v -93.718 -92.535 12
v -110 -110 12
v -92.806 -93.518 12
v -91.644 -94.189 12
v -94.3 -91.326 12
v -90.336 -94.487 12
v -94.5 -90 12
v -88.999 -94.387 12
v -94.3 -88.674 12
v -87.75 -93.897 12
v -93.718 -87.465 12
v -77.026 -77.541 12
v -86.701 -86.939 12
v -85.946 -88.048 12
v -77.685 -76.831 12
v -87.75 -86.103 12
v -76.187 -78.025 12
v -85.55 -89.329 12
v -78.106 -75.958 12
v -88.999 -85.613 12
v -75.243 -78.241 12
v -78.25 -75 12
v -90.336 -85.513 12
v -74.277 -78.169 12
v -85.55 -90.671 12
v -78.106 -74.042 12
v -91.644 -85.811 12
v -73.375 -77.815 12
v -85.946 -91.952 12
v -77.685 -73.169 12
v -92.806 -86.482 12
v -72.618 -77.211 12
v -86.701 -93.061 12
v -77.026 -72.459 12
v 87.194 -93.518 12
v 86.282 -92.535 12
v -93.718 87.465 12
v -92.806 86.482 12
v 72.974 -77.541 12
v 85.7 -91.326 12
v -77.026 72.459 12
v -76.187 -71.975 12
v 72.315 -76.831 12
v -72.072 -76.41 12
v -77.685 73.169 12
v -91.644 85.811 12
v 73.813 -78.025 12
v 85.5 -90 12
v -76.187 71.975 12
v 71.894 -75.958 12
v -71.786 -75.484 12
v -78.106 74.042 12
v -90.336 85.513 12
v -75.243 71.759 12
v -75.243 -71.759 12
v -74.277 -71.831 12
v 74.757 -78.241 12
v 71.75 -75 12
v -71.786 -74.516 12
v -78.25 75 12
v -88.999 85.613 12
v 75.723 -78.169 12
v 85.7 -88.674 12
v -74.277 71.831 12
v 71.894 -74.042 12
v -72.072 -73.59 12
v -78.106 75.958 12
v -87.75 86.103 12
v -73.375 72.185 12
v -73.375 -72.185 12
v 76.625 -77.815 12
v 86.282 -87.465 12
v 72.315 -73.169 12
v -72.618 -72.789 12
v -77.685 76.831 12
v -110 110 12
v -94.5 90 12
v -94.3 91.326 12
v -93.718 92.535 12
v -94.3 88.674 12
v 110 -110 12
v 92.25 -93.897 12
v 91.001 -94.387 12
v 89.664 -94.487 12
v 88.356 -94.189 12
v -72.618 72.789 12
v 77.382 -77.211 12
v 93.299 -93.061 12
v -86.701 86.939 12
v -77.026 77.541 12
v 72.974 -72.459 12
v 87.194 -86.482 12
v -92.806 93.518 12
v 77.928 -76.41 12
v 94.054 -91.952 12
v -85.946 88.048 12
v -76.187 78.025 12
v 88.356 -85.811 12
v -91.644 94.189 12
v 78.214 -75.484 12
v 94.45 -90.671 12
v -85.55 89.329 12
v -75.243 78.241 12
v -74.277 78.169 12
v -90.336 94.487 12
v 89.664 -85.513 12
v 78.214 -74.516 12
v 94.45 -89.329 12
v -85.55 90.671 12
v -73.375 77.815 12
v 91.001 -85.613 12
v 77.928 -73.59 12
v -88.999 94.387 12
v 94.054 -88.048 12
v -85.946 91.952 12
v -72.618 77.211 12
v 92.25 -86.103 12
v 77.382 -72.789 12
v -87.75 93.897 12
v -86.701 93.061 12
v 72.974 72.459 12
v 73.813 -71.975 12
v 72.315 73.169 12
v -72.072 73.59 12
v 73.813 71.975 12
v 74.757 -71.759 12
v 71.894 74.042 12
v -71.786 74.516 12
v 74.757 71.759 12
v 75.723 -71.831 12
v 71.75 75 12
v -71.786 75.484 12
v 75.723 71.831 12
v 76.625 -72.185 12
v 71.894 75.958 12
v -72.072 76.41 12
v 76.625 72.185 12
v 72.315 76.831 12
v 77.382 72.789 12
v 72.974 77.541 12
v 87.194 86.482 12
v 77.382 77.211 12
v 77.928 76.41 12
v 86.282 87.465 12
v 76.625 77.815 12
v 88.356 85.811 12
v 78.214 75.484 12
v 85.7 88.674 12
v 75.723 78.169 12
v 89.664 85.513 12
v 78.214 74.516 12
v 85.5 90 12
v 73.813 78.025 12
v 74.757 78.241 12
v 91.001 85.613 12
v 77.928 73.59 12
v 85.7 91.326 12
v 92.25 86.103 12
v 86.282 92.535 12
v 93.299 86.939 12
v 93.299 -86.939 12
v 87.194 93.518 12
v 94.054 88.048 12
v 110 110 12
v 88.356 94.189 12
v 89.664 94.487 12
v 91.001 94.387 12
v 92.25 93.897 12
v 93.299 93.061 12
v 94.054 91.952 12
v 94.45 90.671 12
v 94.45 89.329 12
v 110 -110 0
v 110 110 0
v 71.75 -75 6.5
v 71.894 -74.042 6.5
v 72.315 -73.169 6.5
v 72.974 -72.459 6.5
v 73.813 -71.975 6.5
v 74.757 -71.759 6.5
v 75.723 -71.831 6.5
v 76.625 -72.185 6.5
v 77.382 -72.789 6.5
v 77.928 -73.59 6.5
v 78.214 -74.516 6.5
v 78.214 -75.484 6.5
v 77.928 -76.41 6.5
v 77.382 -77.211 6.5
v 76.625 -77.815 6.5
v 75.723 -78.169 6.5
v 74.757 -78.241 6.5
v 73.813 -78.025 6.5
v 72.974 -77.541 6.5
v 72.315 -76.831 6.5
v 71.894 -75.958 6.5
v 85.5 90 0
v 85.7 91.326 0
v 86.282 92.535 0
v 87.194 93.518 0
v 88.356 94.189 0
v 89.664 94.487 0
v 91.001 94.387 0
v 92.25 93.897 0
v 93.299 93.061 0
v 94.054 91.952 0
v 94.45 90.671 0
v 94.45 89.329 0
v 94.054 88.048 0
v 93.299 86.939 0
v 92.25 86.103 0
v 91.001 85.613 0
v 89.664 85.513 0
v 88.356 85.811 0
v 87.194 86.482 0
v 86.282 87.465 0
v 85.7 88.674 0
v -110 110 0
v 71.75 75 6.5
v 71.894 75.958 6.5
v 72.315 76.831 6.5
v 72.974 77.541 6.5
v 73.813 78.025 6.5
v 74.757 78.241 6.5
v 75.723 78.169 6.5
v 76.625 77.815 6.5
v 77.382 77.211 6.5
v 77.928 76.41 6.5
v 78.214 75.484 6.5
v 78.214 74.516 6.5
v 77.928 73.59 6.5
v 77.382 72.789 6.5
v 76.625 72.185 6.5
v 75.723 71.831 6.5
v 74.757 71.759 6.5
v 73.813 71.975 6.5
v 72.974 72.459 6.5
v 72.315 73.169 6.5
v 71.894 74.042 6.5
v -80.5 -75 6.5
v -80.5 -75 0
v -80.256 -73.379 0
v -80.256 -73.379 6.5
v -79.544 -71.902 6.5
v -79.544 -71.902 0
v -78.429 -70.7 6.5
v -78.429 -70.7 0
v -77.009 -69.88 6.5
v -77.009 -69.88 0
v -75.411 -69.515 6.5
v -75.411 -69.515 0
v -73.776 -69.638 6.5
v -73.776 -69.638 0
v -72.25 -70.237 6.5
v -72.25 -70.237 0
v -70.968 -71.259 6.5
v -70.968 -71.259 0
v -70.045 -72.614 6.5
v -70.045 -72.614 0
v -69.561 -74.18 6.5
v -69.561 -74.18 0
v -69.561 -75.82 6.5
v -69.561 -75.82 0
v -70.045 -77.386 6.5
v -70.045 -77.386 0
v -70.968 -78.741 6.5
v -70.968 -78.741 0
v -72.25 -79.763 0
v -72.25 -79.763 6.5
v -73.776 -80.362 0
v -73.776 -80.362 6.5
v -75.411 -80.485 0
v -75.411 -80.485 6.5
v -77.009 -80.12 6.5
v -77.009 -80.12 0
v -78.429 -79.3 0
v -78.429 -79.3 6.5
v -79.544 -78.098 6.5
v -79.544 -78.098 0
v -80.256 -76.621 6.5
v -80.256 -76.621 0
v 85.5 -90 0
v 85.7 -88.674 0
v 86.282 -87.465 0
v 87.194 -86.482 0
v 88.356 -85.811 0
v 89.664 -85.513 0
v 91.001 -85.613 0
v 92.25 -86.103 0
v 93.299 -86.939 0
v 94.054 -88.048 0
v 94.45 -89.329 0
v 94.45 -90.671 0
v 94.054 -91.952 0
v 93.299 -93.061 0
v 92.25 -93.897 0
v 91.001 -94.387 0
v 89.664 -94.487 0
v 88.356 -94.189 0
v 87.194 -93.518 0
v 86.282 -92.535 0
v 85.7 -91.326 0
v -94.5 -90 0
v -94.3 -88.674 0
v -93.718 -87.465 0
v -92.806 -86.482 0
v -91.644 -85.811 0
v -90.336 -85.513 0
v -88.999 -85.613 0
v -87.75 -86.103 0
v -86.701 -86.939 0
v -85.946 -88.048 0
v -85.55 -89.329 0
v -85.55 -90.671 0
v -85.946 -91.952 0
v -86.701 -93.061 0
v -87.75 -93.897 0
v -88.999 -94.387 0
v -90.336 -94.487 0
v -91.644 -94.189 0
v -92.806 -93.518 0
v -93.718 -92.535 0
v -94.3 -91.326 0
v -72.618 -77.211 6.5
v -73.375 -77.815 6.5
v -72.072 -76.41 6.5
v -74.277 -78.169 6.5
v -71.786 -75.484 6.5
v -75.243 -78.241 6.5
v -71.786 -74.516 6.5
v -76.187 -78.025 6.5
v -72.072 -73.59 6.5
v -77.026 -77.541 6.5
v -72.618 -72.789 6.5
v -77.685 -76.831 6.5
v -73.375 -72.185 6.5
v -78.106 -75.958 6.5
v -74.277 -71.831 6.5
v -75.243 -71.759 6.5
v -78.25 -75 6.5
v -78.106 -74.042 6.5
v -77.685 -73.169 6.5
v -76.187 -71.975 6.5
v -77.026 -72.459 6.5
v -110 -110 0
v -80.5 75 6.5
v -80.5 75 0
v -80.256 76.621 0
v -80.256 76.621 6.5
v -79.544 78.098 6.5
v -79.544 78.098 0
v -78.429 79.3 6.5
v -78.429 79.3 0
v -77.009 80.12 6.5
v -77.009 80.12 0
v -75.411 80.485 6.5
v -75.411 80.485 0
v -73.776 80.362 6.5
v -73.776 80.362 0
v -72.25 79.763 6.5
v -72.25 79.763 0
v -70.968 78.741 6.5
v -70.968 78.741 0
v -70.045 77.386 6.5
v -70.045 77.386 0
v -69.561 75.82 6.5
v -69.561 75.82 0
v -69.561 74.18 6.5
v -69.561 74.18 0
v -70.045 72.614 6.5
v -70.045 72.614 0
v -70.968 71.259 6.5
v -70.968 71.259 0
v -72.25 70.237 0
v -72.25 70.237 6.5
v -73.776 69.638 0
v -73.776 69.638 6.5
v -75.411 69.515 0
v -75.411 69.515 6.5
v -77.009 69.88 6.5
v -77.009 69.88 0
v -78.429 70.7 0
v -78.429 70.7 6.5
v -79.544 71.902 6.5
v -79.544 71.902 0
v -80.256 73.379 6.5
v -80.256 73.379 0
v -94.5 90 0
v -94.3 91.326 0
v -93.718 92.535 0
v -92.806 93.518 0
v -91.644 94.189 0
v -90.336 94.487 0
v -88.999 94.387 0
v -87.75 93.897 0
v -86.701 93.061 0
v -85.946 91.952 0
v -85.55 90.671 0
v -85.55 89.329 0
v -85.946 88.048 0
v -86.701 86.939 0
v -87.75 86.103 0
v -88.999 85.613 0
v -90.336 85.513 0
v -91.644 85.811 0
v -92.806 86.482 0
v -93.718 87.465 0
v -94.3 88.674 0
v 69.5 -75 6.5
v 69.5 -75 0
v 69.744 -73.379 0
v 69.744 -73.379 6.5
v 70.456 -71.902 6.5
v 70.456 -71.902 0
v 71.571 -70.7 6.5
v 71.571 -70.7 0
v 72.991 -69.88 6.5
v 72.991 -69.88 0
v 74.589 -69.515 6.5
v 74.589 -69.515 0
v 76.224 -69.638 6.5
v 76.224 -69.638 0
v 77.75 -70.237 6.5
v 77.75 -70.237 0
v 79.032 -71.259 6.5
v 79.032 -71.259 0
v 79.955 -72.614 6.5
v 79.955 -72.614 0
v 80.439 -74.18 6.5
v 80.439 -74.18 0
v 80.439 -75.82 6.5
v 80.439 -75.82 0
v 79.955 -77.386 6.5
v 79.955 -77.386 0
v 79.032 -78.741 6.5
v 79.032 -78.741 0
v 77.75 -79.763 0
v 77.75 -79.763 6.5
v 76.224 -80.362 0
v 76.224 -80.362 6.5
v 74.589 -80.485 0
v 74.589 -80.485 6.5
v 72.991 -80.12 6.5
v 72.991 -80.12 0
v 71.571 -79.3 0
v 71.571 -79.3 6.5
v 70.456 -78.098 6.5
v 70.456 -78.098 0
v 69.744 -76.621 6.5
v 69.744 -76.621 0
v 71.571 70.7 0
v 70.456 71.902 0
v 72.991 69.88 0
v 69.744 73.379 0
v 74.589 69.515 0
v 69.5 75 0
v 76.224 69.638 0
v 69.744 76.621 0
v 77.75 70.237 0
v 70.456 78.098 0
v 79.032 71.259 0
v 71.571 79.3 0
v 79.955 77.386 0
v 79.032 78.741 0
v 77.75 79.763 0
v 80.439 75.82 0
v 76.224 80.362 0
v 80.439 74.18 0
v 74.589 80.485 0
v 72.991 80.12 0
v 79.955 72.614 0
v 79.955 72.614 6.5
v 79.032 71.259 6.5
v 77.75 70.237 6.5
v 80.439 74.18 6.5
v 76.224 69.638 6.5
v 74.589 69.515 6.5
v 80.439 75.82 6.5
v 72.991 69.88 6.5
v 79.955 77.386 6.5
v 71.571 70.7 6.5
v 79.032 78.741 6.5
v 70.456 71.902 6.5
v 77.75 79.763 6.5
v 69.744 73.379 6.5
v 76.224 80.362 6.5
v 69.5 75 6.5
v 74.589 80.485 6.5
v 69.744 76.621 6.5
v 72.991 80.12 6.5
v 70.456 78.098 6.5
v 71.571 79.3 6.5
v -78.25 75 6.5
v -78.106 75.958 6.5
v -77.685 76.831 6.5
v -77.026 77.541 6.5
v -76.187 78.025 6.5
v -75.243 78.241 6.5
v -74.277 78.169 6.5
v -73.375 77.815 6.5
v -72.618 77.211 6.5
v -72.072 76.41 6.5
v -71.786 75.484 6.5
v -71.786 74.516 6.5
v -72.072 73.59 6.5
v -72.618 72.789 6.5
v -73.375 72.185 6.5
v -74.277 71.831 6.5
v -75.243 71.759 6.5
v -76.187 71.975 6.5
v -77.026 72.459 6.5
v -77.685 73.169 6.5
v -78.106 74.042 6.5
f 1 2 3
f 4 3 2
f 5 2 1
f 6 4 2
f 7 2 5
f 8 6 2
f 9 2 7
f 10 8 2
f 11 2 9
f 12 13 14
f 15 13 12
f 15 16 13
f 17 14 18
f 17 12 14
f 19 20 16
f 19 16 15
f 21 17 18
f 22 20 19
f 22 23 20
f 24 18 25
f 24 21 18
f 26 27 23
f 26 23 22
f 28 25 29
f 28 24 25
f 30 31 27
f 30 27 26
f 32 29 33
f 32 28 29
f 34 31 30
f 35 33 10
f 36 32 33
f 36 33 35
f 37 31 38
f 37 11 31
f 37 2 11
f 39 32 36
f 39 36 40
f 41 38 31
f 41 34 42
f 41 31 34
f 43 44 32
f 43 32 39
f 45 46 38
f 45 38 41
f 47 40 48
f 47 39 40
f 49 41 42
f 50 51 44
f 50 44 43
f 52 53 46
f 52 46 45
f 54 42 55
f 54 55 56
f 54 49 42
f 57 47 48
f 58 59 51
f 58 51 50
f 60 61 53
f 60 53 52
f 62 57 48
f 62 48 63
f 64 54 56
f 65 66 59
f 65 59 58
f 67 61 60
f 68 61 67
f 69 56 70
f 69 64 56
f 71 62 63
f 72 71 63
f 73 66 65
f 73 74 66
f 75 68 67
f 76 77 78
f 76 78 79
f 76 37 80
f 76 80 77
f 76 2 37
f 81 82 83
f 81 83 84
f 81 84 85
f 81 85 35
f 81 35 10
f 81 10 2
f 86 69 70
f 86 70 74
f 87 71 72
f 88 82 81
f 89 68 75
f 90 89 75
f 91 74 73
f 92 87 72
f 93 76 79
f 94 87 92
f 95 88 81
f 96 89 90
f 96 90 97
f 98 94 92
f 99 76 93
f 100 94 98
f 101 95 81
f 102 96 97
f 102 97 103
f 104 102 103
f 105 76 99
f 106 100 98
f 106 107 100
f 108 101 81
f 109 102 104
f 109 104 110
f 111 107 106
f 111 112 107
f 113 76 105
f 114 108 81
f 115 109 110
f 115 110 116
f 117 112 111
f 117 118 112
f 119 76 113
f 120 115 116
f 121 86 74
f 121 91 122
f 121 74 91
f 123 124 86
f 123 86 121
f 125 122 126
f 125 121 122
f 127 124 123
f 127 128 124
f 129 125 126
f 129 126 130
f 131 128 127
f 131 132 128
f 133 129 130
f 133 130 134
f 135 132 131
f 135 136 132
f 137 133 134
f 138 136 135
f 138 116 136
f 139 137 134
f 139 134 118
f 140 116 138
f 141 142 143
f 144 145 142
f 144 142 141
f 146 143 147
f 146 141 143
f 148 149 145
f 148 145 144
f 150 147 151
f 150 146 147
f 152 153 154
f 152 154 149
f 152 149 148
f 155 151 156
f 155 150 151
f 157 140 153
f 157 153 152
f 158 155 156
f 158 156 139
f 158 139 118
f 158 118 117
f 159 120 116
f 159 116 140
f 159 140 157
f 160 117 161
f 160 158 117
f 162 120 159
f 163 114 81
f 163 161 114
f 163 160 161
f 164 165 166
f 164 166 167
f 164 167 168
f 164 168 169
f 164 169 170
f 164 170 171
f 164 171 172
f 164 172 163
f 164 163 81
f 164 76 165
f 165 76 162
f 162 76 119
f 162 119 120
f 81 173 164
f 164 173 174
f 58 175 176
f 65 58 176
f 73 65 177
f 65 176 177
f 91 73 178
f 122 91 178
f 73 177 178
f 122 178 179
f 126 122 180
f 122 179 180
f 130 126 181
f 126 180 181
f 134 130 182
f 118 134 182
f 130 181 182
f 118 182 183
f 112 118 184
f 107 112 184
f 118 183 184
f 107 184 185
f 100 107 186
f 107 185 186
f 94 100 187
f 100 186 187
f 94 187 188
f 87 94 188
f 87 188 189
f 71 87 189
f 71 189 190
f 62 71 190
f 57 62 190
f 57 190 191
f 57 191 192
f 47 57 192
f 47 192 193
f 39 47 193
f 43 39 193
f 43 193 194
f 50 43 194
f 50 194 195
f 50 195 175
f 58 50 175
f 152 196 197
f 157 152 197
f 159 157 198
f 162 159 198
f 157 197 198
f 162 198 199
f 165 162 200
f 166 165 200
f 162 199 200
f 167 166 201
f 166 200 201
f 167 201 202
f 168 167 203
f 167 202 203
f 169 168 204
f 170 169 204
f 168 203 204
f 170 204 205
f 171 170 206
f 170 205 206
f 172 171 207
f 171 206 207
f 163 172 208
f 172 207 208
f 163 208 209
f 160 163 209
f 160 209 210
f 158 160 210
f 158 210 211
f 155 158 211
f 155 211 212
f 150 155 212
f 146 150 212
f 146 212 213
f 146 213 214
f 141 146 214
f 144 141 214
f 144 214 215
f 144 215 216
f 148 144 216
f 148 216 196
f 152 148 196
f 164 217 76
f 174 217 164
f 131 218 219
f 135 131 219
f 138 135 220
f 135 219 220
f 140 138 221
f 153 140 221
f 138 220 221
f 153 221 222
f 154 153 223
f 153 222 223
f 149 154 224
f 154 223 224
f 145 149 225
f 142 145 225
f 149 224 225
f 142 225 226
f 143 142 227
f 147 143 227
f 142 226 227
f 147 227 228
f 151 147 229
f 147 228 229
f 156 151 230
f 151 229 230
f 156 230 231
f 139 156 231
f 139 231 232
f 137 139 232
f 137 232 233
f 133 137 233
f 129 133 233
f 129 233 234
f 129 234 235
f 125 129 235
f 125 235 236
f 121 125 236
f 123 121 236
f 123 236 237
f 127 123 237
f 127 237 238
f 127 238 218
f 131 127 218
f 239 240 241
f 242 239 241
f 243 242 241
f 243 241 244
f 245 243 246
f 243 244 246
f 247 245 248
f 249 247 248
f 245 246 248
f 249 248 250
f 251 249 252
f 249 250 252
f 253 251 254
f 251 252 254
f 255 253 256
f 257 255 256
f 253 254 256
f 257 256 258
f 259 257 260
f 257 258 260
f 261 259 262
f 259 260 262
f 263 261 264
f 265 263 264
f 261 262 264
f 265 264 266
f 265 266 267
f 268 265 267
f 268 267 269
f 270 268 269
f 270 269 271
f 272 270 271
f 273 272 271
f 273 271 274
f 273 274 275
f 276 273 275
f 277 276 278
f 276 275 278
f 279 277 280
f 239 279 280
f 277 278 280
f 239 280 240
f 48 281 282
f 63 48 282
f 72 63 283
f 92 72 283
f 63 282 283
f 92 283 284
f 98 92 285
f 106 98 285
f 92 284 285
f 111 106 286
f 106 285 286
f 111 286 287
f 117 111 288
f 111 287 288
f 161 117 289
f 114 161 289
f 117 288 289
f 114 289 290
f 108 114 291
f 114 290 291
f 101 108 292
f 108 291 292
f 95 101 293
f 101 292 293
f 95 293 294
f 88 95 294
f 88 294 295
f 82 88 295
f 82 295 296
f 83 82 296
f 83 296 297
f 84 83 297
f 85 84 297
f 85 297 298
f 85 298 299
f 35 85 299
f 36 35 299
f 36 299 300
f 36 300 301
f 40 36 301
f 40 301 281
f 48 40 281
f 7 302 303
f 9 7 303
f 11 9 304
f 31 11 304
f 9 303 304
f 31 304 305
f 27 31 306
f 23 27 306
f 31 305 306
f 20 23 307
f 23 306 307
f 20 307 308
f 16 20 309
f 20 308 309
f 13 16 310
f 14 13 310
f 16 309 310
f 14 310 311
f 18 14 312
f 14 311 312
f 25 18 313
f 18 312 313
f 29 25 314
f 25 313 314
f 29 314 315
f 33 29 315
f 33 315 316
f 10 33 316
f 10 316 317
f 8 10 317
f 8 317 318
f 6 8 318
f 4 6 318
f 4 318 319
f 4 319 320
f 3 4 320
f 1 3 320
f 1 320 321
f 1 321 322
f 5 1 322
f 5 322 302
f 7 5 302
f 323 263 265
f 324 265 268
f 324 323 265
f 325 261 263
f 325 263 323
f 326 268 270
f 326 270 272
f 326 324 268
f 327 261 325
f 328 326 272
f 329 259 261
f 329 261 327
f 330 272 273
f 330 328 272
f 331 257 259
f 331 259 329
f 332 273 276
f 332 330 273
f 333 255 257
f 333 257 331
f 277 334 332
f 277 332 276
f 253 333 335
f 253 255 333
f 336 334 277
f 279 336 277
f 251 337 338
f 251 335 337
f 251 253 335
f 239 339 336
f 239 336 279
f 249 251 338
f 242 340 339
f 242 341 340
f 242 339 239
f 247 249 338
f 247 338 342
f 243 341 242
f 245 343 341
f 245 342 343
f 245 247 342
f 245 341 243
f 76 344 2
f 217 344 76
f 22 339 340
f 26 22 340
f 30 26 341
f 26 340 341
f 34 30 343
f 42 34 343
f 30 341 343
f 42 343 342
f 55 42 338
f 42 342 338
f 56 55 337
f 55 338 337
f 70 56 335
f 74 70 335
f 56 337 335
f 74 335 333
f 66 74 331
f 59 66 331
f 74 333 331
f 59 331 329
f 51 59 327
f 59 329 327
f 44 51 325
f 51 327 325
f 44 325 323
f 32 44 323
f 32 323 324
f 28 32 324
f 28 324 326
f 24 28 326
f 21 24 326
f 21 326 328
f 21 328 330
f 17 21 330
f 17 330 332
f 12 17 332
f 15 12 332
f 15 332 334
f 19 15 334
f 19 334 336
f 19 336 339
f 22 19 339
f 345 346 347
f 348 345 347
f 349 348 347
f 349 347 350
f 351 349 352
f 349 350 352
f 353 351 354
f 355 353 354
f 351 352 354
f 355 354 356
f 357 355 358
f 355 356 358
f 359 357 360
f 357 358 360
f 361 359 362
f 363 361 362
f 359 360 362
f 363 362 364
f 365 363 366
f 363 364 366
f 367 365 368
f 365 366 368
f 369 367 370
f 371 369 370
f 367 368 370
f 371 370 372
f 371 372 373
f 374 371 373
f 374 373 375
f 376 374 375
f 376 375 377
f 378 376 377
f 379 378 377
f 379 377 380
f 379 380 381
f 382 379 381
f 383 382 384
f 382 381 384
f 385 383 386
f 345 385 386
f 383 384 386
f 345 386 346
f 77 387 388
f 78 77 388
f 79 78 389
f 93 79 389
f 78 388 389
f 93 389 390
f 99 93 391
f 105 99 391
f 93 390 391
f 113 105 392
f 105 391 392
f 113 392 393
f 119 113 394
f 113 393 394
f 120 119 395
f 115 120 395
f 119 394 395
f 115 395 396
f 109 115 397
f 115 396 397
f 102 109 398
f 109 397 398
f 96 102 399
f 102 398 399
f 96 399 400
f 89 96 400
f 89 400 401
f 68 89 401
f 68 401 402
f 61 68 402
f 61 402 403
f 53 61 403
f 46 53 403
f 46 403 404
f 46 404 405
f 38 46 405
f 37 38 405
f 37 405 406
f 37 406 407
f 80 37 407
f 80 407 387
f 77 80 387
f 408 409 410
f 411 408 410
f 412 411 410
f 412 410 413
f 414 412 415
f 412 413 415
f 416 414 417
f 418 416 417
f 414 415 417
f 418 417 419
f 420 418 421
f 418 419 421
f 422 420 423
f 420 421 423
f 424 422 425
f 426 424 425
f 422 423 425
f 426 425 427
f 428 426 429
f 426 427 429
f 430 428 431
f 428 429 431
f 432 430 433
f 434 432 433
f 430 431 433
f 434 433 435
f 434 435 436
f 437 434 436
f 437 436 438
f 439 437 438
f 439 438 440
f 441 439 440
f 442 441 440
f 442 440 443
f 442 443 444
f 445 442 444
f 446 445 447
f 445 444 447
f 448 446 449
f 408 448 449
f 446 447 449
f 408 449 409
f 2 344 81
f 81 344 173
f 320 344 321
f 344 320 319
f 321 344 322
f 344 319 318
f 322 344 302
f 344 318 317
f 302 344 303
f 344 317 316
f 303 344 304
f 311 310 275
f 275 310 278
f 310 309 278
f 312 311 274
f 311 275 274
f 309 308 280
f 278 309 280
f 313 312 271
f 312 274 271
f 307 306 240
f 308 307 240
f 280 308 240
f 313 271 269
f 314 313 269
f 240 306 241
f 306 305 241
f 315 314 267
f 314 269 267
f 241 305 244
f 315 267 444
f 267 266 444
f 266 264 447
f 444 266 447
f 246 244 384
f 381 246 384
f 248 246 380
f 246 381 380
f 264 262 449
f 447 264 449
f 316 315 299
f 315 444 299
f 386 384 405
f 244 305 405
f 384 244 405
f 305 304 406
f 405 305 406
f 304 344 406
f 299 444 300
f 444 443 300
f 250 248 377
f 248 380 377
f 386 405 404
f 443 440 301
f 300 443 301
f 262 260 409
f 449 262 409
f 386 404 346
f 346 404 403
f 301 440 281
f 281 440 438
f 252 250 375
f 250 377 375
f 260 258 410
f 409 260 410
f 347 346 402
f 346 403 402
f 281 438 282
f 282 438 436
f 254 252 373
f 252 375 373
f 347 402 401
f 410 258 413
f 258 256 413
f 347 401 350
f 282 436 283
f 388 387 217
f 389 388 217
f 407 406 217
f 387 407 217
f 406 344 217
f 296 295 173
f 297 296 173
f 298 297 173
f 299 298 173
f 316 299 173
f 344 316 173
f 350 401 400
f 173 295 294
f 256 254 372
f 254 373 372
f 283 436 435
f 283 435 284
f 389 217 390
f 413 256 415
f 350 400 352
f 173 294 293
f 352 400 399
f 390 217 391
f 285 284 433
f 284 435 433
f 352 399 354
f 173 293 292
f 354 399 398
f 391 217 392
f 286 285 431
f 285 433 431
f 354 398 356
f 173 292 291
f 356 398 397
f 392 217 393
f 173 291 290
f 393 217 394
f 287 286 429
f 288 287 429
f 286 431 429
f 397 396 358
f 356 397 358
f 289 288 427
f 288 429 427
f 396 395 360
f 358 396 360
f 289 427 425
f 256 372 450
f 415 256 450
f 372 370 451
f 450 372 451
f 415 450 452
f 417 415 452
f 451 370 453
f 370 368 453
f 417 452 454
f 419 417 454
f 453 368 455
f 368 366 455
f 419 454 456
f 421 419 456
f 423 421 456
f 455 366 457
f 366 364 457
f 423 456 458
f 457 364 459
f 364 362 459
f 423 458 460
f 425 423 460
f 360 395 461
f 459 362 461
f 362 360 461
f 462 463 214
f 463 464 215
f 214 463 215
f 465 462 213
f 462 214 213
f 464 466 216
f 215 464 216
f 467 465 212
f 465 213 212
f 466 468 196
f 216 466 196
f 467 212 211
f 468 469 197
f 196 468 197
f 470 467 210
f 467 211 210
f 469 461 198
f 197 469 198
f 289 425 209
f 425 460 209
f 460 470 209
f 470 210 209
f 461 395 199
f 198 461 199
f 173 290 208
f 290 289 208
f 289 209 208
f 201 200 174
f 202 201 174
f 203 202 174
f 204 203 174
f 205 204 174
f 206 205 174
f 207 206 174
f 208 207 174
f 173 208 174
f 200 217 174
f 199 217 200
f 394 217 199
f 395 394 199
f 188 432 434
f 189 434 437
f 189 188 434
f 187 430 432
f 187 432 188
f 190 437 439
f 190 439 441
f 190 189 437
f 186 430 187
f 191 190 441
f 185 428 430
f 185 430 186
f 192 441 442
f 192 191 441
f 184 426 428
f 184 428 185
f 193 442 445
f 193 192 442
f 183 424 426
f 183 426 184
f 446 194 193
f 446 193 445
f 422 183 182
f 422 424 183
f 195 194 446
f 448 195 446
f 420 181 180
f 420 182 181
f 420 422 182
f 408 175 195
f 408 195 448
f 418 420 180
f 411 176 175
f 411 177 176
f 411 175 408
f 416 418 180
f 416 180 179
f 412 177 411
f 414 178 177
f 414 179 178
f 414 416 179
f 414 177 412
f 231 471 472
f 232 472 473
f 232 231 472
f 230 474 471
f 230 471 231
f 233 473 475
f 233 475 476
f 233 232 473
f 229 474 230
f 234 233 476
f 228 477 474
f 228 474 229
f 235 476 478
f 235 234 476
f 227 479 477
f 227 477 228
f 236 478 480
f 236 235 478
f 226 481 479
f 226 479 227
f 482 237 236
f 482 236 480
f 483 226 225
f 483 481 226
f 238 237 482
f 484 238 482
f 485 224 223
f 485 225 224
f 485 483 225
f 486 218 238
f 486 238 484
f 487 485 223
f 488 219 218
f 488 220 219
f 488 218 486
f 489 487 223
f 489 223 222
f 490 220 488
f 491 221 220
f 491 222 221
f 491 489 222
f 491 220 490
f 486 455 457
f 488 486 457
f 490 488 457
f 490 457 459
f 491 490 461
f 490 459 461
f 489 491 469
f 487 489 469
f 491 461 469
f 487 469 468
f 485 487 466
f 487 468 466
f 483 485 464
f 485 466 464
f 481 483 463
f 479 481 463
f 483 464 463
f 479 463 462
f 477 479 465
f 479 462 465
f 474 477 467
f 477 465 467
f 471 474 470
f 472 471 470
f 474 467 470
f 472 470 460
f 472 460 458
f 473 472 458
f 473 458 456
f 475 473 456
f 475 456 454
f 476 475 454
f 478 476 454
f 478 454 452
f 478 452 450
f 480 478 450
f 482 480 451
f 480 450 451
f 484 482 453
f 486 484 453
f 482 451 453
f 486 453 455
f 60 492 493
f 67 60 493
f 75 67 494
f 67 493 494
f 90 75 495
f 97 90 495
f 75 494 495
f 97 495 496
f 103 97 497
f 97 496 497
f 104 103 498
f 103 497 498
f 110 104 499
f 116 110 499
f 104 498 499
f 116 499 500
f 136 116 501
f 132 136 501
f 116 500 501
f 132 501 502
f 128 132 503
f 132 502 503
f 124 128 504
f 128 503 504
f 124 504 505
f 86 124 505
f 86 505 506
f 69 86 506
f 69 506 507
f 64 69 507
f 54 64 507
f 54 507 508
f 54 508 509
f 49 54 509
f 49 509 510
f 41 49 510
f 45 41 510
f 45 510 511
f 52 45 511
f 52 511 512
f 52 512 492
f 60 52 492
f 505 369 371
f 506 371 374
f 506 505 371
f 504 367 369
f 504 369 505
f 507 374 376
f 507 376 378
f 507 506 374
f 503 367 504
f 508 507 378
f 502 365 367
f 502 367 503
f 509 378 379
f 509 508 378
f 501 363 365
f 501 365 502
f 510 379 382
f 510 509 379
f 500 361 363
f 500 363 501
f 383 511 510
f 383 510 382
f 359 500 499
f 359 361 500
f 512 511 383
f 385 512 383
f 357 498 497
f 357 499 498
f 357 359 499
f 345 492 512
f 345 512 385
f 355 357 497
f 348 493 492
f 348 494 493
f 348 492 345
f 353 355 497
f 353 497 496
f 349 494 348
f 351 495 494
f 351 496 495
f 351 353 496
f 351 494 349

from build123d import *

# Parameters (mm, degrees)
SKETCH_1_W          = 220
SKETCH_1_H          = 220
EXTRUDE_1_DEPTH     = 12
SKETCH_2_R          = 4.5
SKETCH_2_R_2        = 3.25
CUT_EXTRUDE_1_DEPTH = 13
SKETCH_3_R          = 5.5
CUT_EXTRUDE_2_DEPTH = 6.5


with BuildPart() as part:
    # 草图1 → 凸台-拉伸1 (new body)
    with BuildSketch(Plane.XY):
        Rectangle(SKETCH_1_W, SKETCH_1_H)
    extrude(amount=EXTRUDE_1_DEPTH)

    # 草图2 → 切除-拉伸1 (cut)
    with BuildSketch(Plane(origin=(0, 0, 0), x_dir=(-1, 0, 0), z_dir=(0, 0, -1))):
        with Locations((90, -90)):
            Circle(SKETCH_2_R)
        with Locations((90, 90)):
            Circle(SKETCH_2_R)
        with Locations((-90, -90)):
            Circle(SKETCH_2_R)
        with Locations((-90, 90)):
            Circle(SKETCH_2_R)
        with Locations((75, -75)):
            Circle(SKETCH_2_R_2)
        with Locations((75, 75)):
            Circle(SKETCH_2_R_2)
        with Locations((-75, -75)):
            Circle(SKETCH_2_R_2)
        with Locations((-75, 75)):
            Circle(SKETCH_2_R_2)
    extrude(amount=-CUT_EXTRUDE_1_DEPTH, mode=Mode.SUBTRACT)

    # 草图3 → 切除-拉伸2 (cut)
    with BuildSketch(Plane(origin=(0, 0, 0), x_dir=(-1, 0, 0), z_dir=(0, 0, -1))):
        with Locations((75, -75)):
            Circle(SKETCH_3_R)
        with Locations((75, 75)):
            Circle(SKETCH_3_R)
        with Locations((-75, -75)):
            Circle(SKETCH_3_R)
        with Locations((-75, 75)):
            Circle(SKETCH_3_R)
    extrude(amount=-CUT_EXTRUDE_2_DEPTH, mode=Mode.SUBTRACT)


solid = part.part
